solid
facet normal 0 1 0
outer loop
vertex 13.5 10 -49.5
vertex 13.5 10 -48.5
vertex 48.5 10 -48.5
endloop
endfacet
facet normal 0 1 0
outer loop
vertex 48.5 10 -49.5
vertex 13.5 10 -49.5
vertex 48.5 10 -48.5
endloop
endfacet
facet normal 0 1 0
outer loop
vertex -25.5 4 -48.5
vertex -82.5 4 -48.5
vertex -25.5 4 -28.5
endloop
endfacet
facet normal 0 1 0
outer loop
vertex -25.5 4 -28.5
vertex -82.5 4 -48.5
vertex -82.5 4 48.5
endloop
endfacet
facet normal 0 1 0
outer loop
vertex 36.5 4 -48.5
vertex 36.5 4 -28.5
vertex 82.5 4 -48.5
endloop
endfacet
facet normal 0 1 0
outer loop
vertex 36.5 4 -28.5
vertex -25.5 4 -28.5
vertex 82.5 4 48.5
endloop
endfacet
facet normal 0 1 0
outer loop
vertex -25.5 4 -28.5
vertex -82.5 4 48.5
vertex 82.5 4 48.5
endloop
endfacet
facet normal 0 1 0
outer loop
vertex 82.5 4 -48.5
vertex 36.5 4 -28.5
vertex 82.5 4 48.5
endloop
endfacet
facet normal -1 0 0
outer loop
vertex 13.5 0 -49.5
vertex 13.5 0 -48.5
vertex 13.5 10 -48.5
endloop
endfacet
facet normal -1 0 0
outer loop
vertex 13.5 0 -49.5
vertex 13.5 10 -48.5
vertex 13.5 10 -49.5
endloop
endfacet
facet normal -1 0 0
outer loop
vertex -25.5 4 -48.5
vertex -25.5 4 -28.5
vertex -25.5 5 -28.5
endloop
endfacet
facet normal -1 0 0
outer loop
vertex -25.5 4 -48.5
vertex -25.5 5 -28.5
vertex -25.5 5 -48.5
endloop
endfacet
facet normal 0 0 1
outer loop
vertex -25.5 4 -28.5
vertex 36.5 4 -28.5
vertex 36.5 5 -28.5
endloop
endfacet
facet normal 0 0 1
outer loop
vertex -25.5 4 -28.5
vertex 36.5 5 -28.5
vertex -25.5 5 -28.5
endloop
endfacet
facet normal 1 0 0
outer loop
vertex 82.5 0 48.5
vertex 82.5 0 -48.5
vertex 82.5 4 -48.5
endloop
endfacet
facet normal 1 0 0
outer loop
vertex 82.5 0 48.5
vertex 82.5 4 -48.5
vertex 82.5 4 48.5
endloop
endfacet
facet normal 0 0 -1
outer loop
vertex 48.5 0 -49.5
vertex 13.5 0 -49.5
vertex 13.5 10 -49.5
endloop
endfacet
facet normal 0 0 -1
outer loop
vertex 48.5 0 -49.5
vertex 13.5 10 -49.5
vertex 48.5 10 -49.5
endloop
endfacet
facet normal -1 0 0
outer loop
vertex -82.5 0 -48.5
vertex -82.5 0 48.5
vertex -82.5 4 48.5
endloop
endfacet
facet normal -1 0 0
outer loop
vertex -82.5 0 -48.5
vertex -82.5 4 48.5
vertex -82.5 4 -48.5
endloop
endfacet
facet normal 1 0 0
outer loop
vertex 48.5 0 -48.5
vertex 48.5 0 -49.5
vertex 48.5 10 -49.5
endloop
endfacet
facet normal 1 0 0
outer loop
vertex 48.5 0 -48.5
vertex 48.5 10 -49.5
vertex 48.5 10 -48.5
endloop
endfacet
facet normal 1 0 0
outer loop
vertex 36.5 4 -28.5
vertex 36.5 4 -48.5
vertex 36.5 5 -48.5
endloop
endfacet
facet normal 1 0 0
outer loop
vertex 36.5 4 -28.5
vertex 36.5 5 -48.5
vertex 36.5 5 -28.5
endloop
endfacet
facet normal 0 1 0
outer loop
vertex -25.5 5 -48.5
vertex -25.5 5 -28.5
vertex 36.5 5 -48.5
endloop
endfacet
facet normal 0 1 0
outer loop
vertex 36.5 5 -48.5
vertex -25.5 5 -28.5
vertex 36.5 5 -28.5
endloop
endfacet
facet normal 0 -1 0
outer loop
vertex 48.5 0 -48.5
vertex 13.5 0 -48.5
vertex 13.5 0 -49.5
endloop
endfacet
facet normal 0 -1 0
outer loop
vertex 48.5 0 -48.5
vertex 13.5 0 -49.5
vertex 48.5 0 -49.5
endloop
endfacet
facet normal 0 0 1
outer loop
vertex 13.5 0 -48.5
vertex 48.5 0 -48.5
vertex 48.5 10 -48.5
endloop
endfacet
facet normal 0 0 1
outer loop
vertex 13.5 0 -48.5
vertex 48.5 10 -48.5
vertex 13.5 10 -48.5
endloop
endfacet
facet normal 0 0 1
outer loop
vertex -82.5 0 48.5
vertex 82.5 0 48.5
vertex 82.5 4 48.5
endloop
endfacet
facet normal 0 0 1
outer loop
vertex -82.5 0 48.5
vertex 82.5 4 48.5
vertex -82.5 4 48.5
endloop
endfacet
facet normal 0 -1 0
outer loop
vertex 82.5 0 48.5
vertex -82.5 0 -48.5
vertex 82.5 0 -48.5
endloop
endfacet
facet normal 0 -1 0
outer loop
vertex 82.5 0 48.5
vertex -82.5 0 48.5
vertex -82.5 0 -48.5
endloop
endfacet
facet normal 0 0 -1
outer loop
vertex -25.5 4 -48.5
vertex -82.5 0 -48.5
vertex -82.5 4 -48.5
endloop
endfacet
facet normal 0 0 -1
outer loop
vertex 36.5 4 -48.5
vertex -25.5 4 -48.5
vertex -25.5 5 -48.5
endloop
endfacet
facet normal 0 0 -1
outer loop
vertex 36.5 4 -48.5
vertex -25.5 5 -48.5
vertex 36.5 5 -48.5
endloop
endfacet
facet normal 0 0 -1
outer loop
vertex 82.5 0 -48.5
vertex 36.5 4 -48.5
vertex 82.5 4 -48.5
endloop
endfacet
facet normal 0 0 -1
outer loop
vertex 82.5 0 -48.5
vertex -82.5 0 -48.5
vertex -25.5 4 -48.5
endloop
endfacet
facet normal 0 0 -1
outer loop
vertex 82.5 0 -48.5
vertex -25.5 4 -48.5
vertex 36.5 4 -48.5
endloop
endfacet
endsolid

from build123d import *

# Parameters (mm, degrees)
F1_DEPTH = 4
F2_DEPTH = 5
F3_DEPTH = 10


with BuildPart() as f1:
    # F0 (on Front) → F1 (new body)
    with BuildSketch(Plane.XZ):
        Polygon((82.5, 48.5), (-82.5, 48.5), (-82.5, -48.5), (-25.5, -48.5), (-25.5, -28.5), (36.5, -28.5), (36.5, -48.5), (48.5, -48.5), (82.5, -48.5), align=None)
    extrude(amount=-F1_DEPTH)

    # F0 (on Front) → F2 (join)
    with BuildSketch(Plane.XZ):
        Polygon((-25.5, -28.5), (-25.5, -48.5), (13.5, -48.5), (36.5, -48.5), (36.5, -28.5), align=None)
    extrude(amount=-F2_DEPTH)


with BuildPart() as f3:
    # F0 (on Front) → F3 (new body)
    with BuildSketch(Plane.XZ):
        Polygon((48.5, -49.5), (48.5, -48.5), (36.5, -48.5), (13.5, -48.5), (13.5, -49.5), align=None)
    extrude(amount=-F3_DEPTH)


solid = Compound([f1.part, f3.part])
